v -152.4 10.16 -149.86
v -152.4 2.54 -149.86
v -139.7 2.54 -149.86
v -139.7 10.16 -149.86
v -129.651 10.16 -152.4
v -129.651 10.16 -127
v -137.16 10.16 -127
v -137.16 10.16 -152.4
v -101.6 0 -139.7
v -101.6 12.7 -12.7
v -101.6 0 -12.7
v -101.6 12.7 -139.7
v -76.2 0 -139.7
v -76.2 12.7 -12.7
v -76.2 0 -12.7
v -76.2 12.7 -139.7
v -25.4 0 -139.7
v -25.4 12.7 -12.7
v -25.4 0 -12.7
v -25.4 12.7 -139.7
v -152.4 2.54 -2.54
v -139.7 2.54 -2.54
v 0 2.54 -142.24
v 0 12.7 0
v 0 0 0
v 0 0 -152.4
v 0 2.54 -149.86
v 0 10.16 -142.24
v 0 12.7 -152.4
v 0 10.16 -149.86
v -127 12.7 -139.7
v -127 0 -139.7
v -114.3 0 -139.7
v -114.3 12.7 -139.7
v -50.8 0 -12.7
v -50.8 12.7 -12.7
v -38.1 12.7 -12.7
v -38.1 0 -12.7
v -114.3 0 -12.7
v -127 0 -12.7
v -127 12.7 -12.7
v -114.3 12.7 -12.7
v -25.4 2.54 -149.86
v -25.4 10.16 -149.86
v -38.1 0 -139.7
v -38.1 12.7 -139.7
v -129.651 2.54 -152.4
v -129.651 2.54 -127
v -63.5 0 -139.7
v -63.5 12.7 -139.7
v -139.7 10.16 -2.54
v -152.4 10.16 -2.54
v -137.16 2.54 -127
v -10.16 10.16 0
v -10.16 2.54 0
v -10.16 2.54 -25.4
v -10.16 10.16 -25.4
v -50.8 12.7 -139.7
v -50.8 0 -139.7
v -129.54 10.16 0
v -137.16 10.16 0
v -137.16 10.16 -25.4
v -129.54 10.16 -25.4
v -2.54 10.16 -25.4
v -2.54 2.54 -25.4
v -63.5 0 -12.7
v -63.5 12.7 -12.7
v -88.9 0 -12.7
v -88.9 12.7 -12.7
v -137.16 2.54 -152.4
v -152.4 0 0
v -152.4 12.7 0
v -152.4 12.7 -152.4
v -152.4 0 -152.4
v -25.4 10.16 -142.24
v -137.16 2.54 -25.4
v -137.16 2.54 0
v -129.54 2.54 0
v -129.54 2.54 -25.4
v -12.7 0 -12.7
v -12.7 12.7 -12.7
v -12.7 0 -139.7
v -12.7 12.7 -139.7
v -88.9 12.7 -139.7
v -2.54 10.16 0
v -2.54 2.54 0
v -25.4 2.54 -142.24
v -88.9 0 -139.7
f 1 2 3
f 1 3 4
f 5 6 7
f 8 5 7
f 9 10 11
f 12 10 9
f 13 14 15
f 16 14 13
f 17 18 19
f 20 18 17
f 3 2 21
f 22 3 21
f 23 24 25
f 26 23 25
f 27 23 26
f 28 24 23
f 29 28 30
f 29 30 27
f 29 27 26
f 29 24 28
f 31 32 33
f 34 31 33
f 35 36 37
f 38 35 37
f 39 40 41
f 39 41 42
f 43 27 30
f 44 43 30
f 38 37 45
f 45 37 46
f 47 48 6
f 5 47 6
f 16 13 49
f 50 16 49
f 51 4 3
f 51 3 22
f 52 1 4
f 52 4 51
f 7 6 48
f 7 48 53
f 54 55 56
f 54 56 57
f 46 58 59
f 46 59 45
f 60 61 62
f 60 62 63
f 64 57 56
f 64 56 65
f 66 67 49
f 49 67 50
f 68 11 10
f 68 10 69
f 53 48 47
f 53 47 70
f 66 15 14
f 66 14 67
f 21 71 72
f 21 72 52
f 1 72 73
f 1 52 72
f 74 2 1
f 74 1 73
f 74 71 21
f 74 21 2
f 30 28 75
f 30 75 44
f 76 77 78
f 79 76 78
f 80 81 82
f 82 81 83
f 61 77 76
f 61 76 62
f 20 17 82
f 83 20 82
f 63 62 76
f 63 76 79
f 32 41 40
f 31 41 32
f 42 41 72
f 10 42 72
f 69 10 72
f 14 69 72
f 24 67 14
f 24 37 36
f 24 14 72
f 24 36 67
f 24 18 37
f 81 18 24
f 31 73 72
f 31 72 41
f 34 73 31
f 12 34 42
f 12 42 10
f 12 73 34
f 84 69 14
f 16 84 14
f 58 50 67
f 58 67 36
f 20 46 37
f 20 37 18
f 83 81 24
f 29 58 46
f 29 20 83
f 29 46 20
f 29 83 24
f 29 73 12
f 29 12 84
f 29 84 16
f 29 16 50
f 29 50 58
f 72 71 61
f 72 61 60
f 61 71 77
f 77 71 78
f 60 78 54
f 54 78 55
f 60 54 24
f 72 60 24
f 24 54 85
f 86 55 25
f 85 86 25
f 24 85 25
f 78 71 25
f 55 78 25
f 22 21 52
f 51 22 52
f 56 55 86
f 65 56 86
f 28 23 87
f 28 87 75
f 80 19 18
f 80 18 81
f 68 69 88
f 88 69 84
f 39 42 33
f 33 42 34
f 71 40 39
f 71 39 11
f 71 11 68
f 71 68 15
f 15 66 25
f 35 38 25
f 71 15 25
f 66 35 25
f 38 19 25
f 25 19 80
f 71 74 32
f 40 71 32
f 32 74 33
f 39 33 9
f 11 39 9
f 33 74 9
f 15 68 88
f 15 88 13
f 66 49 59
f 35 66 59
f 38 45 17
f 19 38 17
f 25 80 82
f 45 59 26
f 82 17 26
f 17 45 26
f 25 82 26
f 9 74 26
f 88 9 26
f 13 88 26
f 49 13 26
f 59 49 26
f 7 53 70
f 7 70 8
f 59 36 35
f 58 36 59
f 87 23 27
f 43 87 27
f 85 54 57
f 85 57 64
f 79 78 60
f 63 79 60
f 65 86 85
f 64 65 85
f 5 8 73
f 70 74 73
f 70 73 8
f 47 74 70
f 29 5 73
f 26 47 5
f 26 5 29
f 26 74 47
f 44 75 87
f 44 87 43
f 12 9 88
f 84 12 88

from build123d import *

# Parameters (mm, degrees)
SKETCH3_W           = 152.4
SKETCH3_H           = 152.4
BOSS_EXTRUDE1_DEPTH = 12.7
SKETCH5_W           = 147.32
SKETCH5_H           = 7.62
CUT_EXTRUDE1_DEPTH  = 12.7
SKETCH6_W           = 12.7
SKETCH6_H           = 127
CUT_EXTRUDE3_DEPTH  = 12.7
SKETCH8_W           = 7.62
SKETCH8_H           = 7.62
CUT_EXTRUDE4_DEPTH  = 25.4
SKETCH9_W           = 7.62
SKETCH9_H           = 7.62
CUT_EXTRUDE5_DEPTH  = 25.4
SKETCH10_W          = 7.508888552
SKETCH10_H          = 7.62
CUT_EXTRUDE6_DEPTH  = 25.4
SKETCH11_W          = 7.62
SKETCH11_H          = 7.62
BOSS_EXTRUDE3_DEPTH = 25.4
SKETCH12_W          = 7.62
SKETCH12_H          = 7.62
CUT_EXTRUDE7_DEPTH  = 25.4


with BuildPart() as part:
    # Sketch3 → Boss-Extrude1 (new body)
    with BuildSketch(Plane(origin=(0, 0, 0), x_dir=(1, 0, 0), z_dir=(0, 1, 0))):
        with Locations((-76.2, 76.2)):
            Rectangle(SKETCH3_W, SKETCH3_H)
    extrude(amount=BOSS_EXTRUDE1_DEPTH)

    # Sketch5 → Cut-Extrude1 (cut)
    with BuildSketch(Plane.ZY.offset(152.4)):
        with Locations((-76.2, 6.35)):
            Rectangle(SKETCH5_W, SKETCH5_H)
    extrude(amount=-CUT_EXTRUDE1_DEPTH, mode=Mode.SUBTRACT)

    # Sketch6 → Cut-Extrude3 (cut)
    with BuildSketch(Plane(origin=(0, 12.7, 0), x_dir=(1, 0, 0), z_dir=(0, 1, 0))):
        with Locations((-120.65, 76.2)):
            Rectangle(SKETCH6_W, SKETCH6_H)
        with Locations((-95.25, 76.2)):
            Rectangle(SKETCH6_W, SKETCH6_H)
        with Locations((-69.85, 76.2)):
            Rectangle(SKETCH6_W, SKETCH6_H)
        with Locations((-44.45, 76.2)):
            Rectangle(SKETCH6_W, SKETCH6_H)
        with Locations((-19.05, 76.2)):
            Rectangle(SKETCH6_W, SKETCH6_H)
    extrude(amount=-CUT_EXTRUDE3_DEPTH, mode=Mode.SUBTRACT)

    # Sketch8 → Cut-Extrude4 (cut)
    with BuildSketch(Plane(origin=(0, 0, 0), x_dir=(0, 0, -1), z_dir=(1, 0, 0))):
        with Locations((146.05, 6.35)):
            Rectangle(SKETCH8_W, SKETCH8_H)
        with Locations((6.35, 6.35)):
            Rectangle(SKETCH8_W, SKETCH8_H)
    extrude(amount=-CUT_EXTRUDE4_DEPTH, mode=Mode.SUBTRACT)

    # Sketch9 → Cut-Extrude5 (cut)
    with BuildSketch(Plane.XY):
        with Locations((-133.35, 6.35)):
            Rectangle(SKETCH9_W, SKETCH9_H)
    extrude(amount=-CUT_EXTRUDE5_DEPTH, mode=Mode.SUBTRACT)

    # Sketch10 → Cut-Extrude6 (cut)
    with BuildSketch(Plane(origin=(0, 0, -152.4), x_dir=(-1, 0, 0), z_dir=(0, 0, -1))):
        with Locations((133.405555724, 6.35)):
            Rectangle(SKETCH10_W, SKETCH10_H)
    extrude(amount=-CUT_EXTRUDE6_DEPTH, mode=Mode.SUBTRACT)

    # Sketch11 → Boss-Extrude3 (add)
    with BuildSketch(Plane(origin=(-25.4, 0, 0), x_dir=(0, 0, -1), z_dir=(1, 0, 0))):
        with Locations((6.35, 6.35)):
            Rectangle(SKETCH11_W, SKETCH11_H)
    extrude(amount=BOSS_EXTRUDE3_DEPTH)

    # Sketch12 → Cut-Extrude7 (cut)
    with BuildSketch(Plane.XY):
        with Locations((-6.35, 6.35)):
            Rectangle(SKETCH12_W, SKETCH12_H)
    extrude(amount=-CUT_EXTRUDE7_DEPTH, mode=Mode.SUBTRACT)


solid = part.part
